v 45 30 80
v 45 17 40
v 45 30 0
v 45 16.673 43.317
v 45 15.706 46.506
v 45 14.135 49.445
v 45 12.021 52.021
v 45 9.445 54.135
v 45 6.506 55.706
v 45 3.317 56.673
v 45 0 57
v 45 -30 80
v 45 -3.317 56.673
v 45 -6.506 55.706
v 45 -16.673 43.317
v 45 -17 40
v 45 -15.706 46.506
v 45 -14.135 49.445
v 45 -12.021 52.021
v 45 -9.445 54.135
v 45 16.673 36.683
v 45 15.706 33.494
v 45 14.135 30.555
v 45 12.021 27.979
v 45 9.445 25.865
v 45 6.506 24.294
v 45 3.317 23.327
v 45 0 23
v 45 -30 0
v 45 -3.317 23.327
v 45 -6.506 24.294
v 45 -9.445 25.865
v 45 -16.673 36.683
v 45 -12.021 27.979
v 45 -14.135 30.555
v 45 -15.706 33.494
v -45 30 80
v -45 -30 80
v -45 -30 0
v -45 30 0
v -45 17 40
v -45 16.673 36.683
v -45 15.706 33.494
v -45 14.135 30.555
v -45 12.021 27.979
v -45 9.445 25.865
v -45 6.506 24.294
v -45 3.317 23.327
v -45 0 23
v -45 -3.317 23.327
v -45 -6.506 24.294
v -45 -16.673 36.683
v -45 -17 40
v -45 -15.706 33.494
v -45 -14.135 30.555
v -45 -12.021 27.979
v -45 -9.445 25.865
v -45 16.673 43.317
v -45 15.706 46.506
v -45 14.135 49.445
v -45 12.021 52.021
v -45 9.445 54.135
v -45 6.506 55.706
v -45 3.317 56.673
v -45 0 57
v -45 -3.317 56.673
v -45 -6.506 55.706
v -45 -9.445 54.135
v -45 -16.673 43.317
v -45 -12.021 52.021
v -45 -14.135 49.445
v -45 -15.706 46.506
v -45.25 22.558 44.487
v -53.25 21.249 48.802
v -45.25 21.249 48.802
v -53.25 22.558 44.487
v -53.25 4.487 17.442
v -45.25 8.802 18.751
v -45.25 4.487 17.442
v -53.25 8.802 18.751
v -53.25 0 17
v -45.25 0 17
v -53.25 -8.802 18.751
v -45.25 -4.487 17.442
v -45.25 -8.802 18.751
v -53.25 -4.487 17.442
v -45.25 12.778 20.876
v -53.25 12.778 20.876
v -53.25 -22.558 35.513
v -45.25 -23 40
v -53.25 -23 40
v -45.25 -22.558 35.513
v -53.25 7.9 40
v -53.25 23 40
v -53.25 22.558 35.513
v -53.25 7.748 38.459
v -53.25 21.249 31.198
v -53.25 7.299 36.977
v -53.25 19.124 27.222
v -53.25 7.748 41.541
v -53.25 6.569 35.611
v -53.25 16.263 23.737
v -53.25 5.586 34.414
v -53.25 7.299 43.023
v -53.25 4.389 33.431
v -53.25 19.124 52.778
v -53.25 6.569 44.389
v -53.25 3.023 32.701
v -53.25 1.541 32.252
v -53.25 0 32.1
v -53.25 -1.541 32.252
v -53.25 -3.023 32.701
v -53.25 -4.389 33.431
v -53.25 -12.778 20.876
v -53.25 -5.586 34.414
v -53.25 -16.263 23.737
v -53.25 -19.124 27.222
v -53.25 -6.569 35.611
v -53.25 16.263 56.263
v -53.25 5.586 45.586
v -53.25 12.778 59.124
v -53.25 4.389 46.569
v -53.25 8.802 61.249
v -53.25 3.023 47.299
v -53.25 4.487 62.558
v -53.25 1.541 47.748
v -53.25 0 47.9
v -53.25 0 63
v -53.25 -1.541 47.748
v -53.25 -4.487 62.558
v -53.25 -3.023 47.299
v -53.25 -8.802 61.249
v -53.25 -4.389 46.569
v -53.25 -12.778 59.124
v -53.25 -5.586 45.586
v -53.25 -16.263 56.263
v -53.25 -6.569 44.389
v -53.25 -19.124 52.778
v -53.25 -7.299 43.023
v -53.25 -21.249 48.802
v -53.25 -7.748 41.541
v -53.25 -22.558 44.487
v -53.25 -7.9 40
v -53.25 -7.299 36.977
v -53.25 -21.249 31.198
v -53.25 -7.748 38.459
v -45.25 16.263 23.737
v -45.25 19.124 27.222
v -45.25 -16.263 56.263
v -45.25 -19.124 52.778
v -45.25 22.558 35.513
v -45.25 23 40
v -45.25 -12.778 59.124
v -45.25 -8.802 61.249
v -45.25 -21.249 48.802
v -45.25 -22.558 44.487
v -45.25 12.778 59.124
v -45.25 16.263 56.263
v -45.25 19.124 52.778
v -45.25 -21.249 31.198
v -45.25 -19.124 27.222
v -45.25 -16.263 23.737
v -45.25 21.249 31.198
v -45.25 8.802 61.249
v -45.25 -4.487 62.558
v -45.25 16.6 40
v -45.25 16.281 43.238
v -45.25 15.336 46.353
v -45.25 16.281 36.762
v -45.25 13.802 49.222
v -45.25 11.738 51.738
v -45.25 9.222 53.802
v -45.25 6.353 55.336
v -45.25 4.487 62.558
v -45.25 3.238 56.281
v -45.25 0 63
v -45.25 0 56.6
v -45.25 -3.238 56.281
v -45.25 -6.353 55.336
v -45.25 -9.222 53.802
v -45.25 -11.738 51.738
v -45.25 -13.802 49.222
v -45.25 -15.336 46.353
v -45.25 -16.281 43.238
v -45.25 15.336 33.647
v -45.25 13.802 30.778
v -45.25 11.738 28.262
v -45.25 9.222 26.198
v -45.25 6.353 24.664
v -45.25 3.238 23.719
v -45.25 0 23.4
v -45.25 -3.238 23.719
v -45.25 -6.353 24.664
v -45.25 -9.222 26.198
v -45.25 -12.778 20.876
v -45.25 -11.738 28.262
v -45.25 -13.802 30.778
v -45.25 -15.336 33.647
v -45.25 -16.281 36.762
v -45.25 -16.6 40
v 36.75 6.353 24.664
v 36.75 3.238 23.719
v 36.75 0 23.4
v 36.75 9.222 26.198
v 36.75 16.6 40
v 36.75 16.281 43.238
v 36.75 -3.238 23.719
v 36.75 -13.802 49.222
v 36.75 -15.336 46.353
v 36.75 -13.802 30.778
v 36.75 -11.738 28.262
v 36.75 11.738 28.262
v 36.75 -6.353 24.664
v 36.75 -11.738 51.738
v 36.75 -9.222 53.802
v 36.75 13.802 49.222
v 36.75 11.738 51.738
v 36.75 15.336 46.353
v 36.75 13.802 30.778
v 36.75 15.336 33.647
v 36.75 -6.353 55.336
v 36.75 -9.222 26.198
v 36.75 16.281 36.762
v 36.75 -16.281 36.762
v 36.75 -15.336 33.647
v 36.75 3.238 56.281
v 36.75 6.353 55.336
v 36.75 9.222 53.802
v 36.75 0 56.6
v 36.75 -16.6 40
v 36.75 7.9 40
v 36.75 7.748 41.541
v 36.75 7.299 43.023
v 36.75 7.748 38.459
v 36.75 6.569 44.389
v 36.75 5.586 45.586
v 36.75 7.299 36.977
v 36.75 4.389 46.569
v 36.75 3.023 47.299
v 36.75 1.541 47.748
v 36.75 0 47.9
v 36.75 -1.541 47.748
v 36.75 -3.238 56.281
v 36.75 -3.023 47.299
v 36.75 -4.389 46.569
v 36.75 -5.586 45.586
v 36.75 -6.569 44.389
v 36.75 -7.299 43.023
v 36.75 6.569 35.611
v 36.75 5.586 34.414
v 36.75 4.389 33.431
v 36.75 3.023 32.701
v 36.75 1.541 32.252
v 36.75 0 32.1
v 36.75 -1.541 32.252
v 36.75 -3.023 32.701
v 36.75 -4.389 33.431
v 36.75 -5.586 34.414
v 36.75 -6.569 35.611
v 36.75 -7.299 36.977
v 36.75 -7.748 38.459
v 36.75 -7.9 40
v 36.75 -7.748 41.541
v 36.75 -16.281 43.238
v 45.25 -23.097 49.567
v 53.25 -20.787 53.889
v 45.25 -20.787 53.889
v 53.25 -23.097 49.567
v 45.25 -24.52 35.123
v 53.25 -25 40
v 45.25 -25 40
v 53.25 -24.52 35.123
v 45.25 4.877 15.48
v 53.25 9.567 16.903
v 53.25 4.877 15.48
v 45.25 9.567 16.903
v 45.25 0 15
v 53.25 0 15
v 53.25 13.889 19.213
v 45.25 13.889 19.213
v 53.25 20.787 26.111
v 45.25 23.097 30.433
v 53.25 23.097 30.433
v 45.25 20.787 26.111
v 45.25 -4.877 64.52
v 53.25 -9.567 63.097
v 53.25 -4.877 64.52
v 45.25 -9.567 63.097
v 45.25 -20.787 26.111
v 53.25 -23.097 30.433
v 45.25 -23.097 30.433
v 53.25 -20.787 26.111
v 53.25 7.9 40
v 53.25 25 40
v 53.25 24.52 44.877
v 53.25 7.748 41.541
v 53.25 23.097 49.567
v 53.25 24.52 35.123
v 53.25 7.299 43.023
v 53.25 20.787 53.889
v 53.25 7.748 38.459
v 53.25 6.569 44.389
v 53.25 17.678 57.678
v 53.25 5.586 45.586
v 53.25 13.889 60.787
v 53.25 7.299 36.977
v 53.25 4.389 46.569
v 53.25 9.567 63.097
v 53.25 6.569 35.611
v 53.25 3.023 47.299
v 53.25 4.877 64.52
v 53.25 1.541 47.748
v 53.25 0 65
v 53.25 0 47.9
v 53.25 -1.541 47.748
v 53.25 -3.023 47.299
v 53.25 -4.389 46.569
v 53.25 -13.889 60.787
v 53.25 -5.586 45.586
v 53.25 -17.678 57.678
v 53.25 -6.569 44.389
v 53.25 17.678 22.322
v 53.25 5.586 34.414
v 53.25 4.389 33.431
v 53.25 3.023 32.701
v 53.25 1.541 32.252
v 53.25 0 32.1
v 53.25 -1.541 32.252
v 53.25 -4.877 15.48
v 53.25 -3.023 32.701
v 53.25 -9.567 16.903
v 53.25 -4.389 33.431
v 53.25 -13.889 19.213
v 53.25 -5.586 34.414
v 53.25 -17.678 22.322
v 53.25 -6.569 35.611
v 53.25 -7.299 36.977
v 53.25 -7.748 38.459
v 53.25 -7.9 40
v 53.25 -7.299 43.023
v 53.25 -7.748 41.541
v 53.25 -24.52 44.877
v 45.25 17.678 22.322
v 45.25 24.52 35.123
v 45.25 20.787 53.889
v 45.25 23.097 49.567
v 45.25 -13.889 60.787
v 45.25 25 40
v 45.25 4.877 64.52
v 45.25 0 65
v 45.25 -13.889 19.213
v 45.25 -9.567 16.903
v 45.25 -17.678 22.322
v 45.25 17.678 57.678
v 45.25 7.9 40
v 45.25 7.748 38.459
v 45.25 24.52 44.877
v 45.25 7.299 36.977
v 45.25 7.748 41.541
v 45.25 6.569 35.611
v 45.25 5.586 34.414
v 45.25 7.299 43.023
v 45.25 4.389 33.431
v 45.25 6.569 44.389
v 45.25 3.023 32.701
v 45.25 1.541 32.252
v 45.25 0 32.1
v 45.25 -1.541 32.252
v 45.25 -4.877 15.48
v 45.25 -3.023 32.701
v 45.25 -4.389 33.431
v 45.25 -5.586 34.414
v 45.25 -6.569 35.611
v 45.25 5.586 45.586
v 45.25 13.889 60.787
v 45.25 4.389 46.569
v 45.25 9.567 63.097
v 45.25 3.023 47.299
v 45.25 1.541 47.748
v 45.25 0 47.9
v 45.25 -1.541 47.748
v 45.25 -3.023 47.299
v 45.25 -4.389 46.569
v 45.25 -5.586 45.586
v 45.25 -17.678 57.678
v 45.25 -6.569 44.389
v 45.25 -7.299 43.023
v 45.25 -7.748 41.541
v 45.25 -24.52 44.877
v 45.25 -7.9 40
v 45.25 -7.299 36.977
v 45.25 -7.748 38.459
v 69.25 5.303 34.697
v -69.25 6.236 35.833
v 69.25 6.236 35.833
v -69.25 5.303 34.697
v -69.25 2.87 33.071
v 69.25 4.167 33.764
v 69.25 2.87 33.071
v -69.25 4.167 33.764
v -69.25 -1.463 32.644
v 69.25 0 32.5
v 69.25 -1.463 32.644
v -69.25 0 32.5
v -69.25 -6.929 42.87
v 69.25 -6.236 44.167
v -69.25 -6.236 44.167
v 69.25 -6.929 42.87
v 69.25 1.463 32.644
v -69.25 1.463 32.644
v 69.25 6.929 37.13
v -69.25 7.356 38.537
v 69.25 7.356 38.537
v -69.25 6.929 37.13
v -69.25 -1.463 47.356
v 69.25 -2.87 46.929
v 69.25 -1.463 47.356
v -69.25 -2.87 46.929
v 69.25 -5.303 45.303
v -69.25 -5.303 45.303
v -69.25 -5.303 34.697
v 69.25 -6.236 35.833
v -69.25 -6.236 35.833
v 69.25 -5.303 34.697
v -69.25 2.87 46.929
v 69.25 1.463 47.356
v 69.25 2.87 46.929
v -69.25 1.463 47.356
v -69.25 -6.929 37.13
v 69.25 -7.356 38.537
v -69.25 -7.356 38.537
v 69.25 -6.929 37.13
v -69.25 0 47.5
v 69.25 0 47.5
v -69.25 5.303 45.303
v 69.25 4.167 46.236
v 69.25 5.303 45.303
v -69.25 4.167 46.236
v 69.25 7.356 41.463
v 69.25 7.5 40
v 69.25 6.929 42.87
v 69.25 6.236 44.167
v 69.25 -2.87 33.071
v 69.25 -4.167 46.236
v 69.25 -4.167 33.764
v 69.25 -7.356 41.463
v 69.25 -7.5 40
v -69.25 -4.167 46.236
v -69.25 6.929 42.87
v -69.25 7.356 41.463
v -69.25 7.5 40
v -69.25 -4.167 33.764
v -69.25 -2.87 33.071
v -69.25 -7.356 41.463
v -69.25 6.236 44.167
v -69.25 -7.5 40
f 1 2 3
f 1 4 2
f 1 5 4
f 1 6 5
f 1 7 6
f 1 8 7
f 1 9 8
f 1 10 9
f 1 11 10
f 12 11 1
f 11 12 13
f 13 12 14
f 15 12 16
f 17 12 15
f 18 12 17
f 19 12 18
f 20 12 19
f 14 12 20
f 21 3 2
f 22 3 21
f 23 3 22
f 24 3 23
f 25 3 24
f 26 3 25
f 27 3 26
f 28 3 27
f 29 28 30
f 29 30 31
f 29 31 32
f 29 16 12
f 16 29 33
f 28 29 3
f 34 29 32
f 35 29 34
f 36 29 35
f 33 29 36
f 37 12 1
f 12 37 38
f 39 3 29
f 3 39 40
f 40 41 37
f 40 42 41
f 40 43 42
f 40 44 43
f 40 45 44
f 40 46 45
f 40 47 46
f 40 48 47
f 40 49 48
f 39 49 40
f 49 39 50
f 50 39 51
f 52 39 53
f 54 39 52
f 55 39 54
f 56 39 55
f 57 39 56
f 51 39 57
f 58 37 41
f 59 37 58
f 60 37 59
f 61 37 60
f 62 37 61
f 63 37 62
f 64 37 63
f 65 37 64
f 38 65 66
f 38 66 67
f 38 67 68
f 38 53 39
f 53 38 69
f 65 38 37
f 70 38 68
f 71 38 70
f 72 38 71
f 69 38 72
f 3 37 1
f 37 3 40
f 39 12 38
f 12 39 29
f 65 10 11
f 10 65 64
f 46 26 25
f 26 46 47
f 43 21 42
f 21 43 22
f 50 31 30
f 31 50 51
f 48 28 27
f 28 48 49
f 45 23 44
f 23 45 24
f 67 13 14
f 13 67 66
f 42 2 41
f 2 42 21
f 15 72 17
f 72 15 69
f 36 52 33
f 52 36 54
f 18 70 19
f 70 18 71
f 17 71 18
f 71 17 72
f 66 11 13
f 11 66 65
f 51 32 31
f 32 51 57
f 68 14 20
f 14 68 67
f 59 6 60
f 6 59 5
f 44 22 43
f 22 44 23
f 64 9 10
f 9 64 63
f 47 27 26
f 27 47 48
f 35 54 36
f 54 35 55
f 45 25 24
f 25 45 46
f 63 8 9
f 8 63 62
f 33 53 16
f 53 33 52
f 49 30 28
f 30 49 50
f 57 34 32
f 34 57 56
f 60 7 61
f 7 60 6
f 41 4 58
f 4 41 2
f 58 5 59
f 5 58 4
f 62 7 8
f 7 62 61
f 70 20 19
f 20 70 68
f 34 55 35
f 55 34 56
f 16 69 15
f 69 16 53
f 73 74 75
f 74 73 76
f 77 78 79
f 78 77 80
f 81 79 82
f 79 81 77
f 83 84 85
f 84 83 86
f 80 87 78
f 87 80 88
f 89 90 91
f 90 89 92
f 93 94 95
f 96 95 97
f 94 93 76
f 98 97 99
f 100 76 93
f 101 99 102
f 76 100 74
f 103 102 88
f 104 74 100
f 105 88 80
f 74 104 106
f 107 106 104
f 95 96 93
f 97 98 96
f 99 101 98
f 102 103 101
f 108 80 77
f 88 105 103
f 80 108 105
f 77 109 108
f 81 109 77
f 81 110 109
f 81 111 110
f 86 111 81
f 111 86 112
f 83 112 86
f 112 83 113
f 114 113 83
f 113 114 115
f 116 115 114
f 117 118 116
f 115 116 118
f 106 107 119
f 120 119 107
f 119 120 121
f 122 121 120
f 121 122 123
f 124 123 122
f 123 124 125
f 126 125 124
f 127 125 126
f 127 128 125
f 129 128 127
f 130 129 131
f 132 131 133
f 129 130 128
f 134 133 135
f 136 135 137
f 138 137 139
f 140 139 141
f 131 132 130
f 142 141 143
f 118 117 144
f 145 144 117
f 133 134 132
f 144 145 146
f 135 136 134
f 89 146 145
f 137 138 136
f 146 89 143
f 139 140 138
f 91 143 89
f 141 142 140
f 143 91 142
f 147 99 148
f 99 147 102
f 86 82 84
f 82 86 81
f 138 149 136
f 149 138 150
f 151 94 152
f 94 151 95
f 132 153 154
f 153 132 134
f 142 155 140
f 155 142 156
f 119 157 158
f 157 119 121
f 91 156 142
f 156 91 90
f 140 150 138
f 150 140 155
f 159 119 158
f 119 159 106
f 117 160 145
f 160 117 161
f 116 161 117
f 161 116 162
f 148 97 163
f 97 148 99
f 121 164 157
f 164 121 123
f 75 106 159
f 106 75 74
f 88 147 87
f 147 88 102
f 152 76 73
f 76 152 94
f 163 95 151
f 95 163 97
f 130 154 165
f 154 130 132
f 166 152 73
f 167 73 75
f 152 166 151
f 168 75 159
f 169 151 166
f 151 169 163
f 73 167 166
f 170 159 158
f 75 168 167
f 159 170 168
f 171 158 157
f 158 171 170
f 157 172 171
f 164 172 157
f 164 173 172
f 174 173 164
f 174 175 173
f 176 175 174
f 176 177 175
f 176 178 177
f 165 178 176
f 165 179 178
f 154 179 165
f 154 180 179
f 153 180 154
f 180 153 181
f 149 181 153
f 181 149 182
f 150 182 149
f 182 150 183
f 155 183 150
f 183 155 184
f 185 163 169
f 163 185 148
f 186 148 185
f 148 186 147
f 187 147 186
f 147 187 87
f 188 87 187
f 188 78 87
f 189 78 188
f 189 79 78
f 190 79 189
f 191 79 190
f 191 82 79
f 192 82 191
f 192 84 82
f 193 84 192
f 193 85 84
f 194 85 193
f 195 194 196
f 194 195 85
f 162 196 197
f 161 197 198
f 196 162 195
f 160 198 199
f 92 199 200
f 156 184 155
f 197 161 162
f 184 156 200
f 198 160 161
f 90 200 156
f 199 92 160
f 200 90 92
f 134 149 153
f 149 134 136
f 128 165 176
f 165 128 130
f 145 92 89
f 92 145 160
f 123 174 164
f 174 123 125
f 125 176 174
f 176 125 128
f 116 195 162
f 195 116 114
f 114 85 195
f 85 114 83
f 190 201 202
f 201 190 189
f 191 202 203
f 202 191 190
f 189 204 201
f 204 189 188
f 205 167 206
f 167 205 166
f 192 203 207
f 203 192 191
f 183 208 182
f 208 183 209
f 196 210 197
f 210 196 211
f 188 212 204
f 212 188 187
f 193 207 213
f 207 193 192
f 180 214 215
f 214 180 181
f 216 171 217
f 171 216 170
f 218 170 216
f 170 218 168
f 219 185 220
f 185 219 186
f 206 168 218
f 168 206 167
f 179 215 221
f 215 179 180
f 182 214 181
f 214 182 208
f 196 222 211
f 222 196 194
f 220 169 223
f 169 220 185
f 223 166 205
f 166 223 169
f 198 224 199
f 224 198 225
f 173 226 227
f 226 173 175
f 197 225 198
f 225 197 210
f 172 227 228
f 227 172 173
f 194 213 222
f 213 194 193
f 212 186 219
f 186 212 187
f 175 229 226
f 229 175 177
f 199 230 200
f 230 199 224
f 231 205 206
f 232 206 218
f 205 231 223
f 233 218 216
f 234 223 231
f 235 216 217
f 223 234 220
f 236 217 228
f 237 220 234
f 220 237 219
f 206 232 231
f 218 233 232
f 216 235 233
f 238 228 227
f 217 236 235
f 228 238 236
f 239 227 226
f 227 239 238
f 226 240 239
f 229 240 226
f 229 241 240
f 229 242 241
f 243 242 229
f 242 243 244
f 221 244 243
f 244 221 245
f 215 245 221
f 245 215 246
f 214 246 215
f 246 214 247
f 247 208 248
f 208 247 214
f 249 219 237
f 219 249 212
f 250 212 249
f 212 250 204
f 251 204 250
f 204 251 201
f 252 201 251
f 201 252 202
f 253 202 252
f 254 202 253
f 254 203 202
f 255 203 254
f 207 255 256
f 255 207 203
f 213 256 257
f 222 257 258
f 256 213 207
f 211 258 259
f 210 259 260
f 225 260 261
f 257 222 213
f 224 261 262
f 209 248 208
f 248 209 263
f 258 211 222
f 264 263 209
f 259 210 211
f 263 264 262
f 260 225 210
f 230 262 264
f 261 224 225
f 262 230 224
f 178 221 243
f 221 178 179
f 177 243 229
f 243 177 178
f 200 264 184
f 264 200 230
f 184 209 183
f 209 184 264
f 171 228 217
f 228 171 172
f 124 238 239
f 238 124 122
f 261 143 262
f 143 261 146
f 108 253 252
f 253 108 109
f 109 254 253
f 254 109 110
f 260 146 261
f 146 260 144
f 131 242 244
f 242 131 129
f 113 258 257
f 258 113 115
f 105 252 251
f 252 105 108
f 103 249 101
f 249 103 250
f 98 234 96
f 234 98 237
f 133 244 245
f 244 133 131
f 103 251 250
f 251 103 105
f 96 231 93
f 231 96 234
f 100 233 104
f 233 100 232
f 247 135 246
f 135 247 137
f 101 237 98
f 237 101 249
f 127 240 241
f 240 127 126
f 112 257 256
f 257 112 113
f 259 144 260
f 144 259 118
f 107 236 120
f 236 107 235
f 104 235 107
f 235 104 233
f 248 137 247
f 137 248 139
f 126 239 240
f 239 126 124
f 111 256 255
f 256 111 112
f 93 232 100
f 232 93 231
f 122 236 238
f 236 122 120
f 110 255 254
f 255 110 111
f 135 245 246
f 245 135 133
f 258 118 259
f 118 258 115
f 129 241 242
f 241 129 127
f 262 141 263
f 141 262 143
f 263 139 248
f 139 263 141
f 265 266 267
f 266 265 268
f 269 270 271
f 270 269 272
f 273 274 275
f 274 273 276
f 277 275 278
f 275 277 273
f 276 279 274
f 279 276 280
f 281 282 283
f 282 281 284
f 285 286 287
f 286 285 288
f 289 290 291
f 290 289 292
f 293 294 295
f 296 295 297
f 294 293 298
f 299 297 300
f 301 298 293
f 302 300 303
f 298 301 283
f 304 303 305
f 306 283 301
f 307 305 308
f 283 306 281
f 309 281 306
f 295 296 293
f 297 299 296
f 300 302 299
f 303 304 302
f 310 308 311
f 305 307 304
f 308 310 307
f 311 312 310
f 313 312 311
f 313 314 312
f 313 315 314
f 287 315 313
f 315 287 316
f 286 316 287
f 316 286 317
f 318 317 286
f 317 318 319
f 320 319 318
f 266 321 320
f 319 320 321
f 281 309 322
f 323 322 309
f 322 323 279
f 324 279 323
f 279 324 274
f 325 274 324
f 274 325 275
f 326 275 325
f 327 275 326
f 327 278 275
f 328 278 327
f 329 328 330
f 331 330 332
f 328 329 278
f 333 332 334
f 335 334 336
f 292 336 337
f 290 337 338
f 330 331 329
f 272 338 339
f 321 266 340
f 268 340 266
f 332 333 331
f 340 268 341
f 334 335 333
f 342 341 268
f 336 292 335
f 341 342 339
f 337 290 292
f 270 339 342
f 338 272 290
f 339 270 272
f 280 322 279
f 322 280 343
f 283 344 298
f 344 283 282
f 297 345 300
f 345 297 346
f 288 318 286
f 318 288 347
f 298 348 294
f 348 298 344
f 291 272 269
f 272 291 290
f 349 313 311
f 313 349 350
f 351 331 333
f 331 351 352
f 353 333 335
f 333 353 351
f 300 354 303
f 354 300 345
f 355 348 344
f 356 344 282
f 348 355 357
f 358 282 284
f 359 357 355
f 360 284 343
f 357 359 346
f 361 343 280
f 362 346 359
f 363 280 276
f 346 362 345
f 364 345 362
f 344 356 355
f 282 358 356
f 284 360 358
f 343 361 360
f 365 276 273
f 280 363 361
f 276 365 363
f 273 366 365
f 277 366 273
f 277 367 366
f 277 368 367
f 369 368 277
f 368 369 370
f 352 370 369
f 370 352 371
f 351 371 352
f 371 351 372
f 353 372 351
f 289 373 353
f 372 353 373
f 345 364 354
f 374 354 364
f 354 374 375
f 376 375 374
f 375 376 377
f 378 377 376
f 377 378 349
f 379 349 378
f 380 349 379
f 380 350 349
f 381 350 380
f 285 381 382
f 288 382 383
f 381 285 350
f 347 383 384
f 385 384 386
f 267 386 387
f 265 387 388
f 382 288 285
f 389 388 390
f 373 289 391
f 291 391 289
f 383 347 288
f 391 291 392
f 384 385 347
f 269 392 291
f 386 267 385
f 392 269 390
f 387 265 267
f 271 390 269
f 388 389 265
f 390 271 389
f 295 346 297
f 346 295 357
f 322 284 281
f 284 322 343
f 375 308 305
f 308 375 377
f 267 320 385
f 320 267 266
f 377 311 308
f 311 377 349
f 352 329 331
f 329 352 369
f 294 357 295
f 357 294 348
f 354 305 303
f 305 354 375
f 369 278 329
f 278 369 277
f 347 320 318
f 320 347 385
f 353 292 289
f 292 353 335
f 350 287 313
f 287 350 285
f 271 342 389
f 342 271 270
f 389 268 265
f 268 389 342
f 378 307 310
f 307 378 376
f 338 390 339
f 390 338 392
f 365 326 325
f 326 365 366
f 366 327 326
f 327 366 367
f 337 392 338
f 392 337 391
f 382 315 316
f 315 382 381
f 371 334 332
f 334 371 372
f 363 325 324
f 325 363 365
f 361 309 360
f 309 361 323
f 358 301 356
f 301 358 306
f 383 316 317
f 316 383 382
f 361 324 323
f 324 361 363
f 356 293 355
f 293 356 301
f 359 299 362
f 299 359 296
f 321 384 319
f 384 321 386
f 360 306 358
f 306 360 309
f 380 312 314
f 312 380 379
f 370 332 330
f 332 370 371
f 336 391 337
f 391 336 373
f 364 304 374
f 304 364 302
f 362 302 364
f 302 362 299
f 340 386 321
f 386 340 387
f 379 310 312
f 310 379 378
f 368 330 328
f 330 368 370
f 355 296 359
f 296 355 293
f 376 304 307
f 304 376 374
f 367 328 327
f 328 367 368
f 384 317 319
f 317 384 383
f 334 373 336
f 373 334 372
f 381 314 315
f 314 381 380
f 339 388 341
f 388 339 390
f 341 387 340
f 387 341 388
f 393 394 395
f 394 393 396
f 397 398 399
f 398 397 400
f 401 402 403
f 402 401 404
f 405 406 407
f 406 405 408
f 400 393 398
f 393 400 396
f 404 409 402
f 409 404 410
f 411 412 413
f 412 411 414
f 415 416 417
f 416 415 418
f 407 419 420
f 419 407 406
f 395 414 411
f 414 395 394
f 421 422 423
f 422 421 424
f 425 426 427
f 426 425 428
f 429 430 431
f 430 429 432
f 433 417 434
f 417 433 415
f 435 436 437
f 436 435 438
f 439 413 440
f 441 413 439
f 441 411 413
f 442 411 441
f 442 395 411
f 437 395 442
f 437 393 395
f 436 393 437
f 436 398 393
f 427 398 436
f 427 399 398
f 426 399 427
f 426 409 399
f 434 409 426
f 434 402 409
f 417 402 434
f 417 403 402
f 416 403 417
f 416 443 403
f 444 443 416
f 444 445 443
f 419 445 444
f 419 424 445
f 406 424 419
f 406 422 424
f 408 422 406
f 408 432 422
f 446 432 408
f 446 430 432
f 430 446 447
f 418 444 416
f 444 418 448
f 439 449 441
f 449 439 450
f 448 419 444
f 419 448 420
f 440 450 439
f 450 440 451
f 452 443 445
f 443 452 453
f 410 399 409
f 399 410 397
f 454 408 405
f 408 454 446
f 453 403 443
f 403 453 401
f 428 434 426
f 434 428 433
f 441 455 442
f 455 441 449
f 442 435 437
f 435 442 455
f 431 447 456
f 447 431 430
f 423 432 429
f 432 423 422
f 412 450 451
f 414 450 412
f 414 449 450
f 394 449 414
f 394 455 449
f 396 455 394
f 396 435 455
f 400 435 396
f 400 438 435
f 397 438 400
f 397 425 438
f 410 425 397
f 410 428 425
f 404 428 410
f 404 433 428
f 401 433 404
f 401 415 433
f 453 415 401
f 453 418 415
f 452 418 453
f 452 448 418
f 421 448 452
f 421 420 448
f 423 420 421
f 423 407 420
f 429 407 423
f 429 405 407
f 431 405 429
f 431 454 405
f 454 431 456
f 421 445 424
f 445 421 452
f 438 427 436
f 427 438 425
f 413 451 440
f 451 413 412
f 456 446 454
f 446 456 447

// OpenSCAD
$fn = 32;

// ------------------------------------------------------------------------
// Bushed housing: 90 x 60 x 80 mm housing, bushing d33.2
// Every part is its own module, assembly() places them once.
// ------------------------------------------------------------------------

// --- part 1 ---
module housing() {
  difference() {
    translate([-45, -30, 0]) cube([90, 60, 80]);
    translate([0, 0, 40]) rotate([0, 90, 0]) cylinder(h = 92, d = 34, center = true);
  }
}

// --- part 2 ---
module bushing() {
  difference() {
    union() {
      cylinder(h = 8, d = 46);
      translate([0, 0, 8]) cylinder(h = 82, d = 33.2);
    }
    translate([0, 0, -1]) cylinder(h = 92, d = 15.8);
  }
}

// --- part 3 ---
module shaft() {
  translate([0, 0, -69.25]) cylinder(h = 138.5, d = 15);
}

// --- part 4 ---
module cover() {
  difference() {
    cylinder(h = 8, d = 50);
    translate([0, 0, -1]) cylinder(h = 10, d = 15.8);
  }
}

// --- assembly ---
module assembly() {
  translate([0, 0, 0]) rotate([0, 0, 0]) housing();
  translate([-53.25, 0, 40]) rotate([0, 90, 0]) bushing();
  translate([0, 0, 40]) rotate([0, 90, 0]) shaft();
  translate([45.25, 0, 40]) rotate([0, 90, 0]) cover();
}

assembly();
